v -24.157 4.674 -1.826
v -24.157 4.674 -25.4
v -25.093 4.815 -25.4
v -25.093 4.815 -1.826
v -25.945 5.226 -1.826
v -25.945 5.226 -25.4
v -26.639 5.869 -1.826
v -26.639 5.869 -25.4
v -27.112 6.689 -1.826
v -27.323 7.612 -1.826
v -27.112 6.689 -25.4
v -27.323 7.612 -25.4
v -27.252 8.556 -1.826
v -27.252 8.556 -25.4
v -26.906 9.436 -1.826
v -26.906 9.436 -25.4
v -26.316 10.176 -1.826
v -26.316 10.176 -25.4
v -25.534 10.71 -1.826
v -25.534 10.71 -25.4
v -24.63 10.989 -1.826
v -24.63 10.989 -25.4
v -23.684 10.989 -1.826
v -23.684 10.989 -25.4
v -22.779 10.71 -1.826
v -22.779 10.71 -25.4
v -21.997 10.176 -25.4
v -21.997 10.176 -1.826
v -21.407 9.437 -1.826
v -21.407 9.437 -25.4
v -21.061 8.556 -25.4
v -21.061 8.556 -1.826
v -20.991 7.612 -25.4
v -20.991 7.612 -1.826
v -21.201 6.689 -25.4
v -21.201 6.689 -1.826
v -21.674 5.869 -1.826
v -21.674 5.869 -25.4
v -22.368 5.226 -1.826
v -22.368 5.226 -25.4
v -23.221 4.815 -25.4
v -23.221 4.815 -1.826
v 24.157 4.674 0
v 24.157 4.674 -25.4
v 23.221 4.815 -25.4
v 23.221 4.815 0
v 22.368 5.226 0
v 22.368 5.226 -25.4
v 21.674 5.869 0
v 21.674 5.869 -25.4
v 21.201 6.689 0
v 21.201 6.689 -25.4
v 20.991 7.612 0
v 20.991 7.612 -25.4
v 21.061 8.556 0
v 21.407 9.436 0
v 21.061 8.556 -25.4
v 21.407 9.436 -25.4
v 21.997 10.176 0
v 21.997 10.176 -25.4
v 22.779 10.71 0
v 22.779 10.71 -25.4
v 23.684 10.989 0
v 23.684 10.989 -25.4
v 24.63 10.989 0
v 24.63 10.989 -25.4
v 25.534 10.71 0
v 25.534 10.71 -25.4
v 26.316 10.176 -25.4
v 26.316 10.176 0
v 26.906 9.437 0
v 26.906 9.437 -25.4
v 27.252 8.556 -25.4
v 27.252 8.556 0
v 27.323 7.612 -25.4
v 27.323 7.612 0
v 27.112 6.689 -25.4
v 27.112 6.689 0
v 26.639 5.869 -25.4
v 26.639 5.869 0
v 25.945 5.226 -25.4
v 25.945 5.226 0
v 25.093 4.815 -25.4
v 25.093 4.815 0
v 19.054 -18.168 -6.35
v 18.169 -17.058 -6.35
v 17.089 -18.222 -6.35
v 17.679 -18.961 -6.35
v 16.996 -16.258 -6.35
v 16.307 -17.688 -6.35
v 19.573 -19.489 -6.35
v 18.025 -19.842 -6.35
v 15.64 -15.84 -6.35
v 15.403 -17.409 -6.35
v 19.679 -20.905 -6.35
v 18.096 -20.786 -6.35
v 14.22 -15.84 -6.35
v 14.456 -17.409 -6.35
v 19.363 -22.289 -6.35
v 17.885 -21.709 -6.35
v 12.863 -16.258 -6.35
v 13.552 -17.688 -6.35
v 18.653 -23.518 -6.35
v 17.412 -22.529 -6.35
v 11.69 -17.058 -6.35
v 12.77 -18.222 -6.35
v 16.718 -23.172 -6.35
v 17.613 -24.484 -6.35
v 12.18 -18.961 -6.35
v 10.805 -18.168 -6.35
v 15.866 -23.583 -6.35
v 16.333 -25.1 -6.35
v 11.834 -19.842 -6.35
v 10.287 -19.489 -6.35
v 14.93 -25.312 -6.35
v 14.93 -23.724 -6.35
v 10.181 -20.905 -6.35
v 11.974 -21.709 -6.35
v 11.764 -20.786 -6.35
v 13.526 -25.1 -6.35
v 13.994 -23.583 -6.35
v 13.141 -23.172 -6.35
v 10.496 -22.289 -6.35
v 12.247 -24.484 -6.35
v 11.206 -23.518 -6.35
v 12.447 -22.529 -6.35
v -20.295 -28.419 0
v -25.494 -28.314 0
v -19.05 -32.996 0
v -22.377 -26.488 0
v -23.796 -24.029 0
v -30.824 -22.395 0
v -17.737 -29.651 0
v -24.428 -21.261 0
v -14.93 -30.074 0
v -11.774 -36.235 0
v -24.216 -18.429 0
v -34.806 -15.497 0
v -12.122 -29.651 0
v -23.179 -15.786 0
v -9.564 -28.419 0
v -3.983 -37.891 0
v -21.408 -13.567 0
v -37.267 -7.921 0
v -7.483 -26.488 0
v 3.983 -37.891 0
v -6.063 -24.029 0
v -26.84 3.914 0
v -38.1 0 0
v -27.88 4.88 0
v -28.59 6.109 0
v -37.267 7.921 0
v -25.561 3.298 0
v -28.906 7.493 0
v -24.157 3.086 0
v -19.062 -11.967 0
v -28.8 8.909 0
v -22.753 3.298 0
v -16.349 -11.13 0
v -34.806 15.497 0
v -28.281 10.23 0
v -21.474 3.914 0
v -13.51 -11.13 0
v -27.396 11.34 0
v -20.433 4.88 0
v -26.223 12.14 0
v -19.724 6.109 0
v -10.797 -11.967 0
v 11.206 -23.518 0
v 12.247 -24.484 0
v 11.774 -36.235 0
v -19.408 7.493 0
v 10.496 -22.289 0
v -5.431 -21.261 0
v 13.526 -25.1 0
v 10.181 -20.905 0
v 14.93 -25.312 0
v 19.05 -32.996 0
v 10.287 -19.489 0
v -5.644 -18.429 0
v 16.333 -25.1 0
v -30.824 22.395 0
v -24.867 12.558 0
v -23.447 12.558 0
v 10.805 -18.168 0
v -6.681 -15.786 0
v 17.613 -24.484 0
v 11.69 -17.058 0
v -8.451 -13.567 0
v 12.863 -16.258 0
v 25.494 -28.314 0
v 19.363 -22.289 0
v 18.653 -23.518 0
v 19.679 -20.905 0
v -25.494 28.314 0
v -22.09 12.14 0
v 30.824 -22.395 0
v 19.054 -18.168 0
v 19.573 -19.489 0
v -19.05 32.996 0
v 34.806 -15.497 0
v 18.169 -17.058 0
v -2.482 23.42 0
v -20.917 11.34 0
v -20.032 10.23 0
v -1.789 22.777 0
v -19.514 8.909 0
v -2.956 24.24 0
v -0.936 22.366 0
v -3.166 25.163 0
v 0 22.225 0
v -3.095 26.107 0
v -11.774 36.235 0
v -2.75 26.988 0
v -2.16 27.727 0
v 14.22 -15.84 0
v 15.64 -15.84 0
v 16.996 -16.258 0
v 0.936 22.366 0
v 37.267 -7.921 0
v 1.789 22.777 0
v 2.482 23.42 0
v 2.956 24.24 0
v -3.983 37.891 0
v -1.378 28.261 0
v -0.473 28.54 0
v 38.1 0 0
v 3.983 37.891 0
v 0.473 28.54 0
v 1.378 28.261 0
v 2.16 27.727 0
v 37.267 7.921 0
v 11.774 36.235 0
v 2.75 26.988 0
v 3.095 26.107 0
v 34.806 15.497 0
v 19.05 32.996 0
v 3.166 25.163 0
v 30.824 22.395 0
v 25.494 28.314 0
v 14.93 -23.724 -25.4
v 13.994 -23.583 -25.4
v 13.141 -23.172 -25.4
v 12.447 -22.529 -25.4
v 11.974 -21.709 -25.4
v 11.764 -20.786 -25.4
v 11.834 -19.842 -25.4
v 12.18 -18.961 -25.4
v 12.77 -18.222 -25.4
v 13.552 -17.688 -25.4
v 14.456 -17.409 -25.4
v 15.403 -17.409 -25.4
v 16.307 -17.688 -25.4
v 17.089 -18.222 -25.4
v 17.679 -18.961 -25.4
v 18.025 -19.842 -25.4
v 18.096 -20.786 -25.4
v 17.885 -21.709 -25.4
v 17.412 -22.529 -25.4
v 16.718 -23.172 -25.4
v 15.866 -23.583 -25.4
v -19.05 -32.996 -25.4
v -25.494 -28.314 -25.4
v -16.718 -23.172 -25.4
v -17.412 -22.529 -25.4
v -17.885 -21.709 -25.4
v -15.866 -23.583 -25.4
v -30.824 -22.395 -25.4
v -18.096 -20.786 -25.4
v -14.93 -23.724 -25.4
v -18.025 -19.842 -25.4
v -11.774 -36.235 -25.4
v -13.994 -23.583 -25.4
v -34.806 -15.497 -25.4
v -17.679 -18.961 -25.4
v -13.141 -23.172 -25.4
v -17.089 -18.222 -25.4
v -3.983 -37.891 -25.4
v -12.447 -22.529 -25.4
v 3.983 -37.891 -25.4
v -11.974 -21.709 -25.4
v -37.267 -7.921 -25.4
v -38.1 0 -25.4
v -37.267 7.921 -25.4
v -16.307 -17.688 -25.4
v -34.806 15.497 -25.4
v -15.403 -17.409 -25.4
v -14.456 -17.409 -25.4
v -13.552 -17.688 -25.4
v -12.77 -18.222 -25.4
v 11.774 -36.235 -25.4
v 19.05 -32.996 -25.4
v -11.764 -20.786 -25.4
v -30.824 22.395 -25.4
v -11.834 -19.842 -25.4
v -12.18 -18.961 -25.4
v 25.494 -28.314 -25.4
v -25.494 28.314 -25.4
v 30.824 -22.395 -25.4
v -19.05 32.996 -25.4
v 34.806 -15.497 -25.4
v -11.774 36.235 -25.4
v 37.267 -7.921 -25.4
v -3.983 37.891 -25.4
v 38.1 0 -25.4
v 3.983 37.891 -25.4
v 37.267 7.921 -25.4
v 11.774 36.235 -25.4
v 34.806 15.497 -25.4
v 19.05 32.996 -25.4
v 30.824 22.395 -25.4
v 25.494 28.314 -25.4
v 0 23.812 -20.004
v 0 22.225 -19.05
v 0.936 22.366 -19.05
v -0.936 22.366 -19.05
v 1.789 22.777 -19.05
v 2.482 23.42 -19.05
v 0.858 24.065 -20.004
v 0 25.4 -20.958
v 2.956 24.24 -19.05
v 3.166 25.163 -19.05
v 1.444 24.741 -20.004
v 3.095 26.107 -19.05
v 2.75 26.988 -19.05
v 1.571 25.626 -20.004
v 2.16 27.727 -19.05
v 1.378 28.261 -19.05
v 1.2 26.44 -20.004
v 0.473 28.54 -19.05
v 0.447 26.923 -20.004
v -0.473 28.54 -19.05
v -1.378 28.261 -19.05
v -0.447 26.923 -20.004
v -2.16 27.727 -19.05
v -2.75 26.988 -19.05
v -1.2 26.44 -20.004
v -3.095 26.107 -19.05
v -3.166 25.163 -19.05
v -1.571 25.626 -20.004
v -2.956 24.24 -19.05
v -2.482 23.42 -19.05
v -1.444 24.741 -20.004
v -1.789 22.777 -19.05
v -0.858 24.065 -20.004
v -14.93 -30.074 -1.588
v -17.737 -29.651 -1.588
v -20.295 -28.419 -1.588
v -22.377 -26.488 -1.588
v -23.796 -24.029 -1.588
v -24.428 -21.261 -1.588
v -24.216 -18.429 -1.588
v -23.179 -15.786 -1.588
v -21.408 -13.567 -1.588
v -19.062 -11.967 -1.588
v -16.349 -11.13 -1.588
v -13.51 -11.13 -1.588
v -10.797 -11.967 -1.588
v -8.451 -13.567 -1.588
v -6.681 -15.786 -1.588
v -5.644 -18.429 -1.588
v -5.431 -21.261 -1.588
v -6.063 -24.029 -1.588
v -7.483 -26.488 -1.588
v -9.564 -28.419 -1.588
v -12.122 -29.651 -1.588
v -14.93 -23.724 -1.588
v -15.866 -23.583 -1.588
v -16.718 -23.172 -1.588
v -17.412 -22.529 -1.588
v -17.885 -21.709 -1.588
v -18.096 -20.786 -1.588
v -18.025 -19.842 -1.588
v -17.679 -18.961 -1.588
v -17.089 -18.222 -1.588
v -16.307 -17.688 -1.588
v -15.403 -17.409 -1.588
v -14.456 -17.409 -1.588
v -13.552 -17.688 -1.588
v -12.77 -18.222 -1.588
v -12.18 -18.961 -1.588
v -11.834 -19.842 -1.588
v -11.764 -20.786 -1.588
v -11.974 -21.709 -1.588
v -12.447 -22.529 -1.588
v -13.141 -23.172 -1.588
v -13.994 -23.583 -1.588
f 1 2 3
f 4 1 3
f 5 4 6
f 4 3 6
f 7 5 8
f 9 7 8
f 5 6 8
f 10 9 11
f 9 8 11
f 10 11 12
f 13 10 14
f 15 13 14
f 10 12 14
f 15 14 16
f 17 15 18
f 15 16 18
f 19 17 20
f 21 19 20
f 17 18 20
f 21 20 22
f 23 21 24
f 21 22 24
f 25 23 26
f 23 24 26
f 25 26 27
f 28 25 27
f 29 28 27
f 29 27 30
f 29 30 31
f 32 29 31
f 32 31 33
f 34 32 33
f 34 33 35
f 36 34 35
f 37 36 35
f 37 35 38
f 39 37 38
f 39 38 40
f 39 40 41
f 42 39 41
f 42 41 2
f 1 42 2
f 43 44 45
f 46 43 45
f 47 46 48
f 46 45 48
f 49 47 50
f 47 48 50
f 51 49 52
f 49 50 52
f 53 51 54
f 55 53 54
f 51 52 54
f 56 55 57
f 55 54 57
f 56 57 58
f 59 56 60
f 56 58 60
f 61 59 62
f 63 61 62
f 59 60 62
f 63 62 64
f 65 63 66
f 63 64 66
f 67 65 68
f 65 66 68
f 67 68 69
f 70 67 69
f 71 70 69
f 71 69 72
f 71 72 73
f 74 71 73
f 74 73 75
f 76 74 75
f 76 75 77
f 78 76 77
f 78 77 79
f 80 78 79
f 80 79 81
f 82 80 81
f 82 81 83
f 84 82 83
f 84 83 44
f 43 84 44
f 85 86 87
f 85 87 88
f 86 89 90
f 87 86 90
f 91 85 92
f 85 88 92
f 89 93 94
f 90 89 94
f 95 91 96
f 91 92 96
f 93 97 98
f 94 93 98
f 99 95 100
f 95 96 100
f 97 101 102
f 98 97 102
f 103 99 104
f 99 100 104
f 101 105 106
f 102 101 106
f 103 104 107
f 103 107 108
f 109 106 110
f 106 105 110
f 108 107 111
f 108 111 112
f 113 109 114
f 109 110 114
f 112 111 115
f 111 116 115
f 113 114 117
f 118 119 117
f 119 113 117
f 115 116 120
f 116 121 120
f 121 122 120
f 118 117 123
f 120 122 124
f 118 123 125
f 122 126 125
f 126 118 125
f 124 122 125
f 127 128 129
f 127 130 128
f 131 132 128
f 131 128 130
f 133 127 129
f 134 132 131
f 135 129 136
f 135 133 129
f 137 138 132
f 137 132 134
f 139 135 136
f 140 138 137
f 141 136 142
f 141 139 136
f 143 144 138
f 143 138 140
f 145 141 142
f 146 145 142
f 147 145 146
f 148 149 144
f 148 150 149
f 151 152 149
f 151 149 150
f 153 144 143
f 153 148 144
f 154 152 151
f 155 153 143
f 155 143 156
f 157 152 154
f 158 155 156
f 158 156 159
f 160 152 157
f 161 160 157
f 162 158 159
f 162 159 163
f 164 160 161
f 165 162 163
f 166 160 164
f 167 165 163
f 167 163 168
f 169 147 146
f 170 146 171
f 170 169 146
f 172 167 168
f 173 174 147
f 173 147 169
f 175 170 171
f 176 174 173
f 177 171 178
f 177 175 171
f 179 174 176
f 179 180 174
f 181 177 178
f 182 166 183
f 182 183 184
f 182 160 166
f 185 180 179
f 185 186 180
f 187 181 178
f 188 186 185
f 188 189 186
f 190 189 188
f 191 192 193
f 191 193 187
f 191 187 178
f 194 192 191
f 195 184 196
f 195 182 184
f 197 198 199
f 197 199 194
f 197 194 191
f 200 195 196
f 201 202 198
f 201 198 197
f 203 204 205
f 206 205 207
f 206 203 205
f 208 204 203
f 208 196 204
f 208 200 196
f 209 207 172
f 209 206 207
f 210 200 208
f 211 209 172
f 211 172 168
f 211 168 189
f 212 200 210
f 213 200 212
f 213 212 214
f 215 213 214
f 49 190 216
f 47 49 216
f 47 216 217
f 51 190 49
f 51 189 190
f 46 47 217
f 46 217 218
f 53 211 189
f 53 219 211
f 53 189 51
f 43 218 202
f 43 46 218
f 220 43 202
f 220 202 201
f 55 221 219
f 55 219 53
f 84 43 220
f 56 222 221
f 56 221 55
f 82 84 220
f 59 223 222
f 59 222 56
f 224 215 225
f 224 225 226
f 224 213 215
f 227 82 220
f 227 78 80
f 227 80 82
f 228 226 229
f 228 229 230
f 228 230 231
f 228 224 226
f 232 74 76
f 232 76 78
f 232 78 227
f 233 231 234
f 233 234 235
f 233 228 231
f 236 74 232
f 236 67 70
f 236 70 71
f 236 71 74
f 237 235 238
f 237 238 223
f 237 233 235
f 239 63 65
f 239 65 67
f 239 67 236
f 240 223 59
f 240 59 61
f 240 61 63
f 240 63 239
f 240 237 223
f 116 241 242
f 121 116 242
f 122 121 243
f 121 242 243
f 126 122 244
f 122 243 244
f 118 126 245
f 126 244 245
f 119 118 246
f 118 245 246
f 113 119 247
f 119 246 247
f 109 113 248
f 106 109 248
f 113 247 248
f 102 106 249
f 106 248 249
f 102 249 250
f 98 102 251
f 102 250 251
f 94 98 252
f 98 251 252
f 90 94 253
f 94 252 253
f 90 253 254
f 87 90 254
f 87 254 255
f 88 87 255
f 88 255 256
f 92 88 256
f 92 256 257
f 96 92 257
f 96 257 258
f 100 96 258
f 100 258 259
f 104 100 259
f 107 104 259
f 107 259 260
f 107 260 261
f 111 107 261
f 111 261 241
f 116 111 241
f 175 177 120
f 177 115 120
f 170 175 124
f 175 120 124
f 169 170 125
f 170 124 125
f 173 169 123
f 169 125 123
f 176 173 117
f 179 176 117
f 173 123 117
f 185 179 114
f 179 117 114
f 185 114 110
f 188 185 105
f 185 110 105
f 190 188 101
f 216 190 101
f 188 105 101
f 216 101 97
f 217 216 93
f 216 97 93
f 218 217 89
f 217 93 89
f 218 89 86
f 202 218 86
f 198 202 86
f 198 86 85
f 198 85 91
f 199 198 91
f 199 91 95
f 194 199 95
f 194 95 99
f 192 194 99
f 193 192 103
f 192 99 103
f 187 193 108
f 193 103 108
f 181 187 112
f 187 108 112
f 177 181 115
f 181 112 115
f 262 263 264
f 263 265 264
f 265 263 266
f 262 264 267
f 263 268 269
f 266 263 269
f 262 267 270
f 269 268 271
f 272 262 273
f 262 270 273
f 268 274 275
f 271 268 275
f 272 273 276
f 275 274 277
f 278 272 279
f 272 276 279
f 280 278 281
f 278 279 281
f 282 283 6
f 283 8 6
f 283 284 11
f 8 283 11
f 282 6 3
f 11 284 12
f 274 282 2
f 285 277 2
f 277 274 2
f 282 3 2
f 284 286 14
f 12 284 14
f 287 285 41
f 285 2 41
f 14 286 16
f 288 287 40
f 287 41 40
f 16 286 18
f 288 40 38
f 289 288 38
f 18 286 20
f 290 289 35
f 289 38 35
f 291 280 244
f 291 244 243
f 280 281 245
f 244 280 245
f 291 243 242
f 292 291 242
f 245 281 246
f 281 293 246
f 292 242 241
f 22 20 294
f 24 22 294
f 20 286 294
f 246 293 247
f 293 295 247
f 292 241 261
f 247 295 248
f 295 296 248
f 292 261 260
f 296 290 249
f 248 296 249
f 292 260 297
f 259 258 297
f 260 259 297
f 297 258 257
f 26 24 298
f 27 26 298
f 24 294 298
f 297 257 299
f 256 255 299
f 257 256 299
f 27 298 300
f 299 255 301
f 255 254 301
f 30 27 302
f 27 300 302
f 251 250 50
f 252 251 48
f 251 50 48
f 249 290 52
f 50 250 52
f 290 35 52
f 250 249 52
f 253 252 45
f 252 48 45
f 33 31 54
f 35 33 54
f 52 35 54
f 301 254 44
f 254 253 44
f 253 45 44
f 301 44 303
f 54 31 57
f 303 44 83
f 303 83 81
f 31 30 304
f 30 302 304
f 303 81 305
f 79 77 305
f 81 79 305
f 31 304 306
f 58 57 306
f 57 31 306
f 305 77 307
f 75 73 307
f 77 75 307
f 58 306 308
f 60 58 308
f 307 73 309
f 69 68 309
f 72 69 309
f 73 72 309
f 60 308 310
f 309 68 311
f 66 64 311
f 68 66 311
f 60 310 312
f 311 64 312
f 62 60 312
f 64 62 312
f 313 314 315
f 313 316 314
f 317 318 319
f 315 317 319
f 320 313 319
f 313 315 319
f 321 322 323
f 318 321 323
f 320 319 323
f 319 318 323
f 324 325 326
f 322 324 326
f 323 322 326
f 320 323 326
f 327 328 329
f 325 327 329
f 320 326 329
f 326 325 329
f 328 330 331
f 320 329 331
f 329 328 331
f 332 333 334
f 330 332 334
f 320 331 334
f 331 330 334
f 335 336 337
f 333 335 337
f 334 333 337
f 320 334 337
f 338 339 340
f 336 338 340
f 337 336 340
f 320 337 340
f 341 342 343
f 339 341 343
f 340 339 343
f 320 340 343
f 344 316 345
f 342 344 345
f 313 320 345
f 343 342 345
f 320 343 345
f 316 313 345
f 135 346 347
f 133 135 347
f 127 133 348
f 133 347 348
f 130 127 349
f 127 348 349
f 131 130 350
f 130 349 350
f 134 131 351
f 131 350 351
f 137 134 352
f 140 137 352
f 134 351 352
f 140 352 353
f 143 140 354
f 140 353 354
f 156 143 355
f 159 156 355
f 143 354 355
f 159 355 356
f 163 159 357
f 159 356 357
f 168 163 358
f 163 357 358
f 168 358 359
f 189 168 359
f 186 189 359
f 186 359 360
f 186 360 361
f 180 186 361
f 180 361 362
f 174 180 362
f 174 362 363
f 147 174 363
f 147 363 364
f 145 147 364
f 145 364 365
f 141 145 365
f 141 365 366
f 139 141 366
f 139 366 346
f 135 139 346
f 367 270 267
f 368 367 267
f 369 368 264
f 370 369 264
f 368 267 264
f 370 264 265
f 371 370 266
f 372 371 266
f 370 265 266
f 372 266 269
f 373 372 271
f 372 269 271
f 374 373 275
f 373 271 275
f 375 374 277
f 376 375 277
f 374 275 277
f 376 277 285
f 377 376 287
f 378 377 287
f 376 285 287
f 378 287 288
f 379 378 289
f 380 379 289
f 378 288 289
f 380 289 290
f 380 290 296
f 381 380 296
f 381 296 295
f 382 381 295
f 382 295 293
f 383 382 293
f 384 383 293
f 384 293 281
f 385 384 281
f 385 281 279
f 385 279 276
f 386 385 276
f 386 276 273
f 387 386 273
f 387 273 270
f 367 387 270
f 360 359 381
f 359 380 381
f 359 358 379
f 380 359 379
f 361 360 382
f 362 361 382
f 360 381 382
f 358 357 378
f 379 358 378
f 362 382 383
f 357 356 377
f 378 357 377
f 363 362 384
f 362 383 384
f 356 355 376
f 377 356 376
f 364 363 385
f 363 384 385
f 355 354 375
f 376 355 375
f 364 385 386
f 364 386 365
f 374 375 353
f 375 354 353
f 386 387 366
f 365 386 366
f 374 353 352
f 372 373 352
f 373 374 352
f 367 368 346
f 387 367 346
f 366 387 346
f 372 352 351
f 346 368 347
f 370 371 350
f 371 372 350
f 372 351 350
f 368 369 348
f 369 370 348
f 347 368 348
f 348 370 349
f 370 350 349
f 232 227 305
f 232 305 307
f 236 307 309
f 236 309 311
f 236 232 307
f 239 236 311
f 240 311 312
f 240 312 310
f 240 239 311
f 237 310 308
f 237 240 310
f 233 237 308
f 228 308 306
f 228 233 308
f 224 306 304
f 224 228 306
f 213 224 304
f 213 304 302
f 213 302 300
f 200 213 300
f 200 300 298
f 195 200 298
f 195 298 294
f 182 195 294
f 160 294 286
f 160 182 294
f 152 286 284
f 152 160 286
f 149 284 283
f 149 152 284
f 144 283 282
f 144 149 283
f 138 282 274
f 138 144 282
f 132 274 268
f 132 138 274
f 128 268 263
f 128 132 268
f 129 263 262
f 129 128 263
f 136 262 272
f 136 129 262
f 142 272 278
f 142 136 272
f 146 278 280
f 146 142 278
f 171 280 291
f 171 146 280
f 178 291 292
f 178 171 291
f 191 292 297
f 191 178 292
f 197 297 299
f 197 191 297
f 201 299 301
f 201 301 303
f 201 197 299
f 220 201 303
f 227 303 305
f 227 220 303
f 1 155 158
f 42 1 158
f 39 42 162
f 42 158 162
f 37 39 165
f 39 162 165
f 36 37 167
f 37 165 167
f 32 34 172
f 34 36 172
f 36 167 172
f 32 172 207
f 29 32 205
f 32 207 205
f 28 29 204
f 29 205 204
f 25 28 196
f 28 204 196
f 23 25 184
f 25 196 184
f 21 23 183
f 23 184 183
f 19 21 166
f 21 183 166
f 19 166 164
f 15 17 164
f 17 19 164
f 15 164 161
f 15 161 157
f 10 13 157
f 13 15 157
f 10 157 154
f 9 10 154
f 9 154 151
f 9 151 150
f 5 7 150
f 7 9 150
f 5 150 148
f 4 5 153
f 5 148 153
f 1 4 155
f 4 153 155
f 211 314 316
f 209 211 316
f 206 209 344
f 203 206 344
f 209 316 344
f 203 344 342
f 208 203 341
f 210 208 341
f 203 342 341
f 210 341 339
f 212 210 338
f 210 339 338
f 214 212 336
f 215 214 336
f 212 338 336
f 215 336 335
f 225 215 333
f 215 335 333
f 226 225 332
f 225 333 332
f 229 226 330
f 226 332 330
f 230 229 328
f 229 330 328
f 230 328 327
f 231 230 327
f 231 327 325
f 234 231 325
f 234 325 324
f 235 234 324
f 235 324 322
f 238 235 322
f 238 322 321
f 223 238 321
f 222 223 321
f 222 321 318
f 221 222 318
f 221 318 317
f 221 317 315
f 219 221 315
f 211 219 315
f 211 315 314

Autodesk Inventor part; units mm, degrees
ref_plane "YZ Plane" through (0, 0, 0) normal (1, 0, 0) x (0, 1, 0)
ref_plane "XZ Plane" through (0, 0, 0) normal (0, 1, 0) x (-1, 0, 0)
ref_plane "XY Plane" through (0, 0, 0) normal (0, 0, 1) x (1, 0, 0)
sketch "Sketch1" plane through (0, 0, 0) normal (0, 0, 1) x (1, 0, 0)
  circle A0 centre (0, 0) radius 38.1
  dimension "d0" = 76.2
extrude "Extrusion1" add sketch "Sketch1" against normal blind 25.4
sketch "Sketch2" plane through (0, 0, 0) normal (0, 0, 1) x (1, 0, 0)
  line L0 (0, 0) -> (0, 25.4)
  point P0 (-24.1568, 7.849)
  point P1 (-14.9297, -20.549)
  point P2 (14.9297, -20.549)
  point P3 (24.1568, 7.849)
  dimension "d5" = 360
hole "Hole1" at (0, 25.4, 0) direction (0, 0, -1) diameter 6.35 depth 19.05 tip angle 118
sketch "Sketch3" plane through (0, 0, 0) normal (0, 0, 1) x (1, 0, 0)
  point P0 (0, 0)
sketch "Sketch4" plane through (0, 0, 0) normal (0, 0, 1) x (1, 0, 0)
  point P0 (0, 0)
sketch "Sketch5" plane through (0, 0, 0) normal (0, 0, 1) x (1, 0, 0)
  point P0 (0, 0)
sketch "Sketch6" plane through (0, 0, 0) normal (0, 0, 1) x (1, 0, 0)
  point P0 (0, 0)
sketch "Sketch7" plane through (0, 0, 0) normal (0, 0, 1) x (1, 0, 0)
  point P0 (0, 0)
hole "Hole2" at (24.1568, 7.849, 0) direction (0, 0, -1) diameter 6.35 end through all
hole "Hole3" at (14.9297, -20.549, 0) direction (0, 0, -1) diameter 6.35 end through all counterbore diameter 9.525 counterbore depth 6.35
hole "Hole4" at (-14.9297, -20.549, 0) direction (0, 0, -1) diameter 6.35 end through all counterbore diameter 19.05 counterbore depth 1.5875
hole "Hole5" at (-24.1568, 7.849, 0) direction (0, 0, -1) diameter 6.35 end through all countersink diameter 9.525 countersink angle 82
properties part number "Drilled Holes"
